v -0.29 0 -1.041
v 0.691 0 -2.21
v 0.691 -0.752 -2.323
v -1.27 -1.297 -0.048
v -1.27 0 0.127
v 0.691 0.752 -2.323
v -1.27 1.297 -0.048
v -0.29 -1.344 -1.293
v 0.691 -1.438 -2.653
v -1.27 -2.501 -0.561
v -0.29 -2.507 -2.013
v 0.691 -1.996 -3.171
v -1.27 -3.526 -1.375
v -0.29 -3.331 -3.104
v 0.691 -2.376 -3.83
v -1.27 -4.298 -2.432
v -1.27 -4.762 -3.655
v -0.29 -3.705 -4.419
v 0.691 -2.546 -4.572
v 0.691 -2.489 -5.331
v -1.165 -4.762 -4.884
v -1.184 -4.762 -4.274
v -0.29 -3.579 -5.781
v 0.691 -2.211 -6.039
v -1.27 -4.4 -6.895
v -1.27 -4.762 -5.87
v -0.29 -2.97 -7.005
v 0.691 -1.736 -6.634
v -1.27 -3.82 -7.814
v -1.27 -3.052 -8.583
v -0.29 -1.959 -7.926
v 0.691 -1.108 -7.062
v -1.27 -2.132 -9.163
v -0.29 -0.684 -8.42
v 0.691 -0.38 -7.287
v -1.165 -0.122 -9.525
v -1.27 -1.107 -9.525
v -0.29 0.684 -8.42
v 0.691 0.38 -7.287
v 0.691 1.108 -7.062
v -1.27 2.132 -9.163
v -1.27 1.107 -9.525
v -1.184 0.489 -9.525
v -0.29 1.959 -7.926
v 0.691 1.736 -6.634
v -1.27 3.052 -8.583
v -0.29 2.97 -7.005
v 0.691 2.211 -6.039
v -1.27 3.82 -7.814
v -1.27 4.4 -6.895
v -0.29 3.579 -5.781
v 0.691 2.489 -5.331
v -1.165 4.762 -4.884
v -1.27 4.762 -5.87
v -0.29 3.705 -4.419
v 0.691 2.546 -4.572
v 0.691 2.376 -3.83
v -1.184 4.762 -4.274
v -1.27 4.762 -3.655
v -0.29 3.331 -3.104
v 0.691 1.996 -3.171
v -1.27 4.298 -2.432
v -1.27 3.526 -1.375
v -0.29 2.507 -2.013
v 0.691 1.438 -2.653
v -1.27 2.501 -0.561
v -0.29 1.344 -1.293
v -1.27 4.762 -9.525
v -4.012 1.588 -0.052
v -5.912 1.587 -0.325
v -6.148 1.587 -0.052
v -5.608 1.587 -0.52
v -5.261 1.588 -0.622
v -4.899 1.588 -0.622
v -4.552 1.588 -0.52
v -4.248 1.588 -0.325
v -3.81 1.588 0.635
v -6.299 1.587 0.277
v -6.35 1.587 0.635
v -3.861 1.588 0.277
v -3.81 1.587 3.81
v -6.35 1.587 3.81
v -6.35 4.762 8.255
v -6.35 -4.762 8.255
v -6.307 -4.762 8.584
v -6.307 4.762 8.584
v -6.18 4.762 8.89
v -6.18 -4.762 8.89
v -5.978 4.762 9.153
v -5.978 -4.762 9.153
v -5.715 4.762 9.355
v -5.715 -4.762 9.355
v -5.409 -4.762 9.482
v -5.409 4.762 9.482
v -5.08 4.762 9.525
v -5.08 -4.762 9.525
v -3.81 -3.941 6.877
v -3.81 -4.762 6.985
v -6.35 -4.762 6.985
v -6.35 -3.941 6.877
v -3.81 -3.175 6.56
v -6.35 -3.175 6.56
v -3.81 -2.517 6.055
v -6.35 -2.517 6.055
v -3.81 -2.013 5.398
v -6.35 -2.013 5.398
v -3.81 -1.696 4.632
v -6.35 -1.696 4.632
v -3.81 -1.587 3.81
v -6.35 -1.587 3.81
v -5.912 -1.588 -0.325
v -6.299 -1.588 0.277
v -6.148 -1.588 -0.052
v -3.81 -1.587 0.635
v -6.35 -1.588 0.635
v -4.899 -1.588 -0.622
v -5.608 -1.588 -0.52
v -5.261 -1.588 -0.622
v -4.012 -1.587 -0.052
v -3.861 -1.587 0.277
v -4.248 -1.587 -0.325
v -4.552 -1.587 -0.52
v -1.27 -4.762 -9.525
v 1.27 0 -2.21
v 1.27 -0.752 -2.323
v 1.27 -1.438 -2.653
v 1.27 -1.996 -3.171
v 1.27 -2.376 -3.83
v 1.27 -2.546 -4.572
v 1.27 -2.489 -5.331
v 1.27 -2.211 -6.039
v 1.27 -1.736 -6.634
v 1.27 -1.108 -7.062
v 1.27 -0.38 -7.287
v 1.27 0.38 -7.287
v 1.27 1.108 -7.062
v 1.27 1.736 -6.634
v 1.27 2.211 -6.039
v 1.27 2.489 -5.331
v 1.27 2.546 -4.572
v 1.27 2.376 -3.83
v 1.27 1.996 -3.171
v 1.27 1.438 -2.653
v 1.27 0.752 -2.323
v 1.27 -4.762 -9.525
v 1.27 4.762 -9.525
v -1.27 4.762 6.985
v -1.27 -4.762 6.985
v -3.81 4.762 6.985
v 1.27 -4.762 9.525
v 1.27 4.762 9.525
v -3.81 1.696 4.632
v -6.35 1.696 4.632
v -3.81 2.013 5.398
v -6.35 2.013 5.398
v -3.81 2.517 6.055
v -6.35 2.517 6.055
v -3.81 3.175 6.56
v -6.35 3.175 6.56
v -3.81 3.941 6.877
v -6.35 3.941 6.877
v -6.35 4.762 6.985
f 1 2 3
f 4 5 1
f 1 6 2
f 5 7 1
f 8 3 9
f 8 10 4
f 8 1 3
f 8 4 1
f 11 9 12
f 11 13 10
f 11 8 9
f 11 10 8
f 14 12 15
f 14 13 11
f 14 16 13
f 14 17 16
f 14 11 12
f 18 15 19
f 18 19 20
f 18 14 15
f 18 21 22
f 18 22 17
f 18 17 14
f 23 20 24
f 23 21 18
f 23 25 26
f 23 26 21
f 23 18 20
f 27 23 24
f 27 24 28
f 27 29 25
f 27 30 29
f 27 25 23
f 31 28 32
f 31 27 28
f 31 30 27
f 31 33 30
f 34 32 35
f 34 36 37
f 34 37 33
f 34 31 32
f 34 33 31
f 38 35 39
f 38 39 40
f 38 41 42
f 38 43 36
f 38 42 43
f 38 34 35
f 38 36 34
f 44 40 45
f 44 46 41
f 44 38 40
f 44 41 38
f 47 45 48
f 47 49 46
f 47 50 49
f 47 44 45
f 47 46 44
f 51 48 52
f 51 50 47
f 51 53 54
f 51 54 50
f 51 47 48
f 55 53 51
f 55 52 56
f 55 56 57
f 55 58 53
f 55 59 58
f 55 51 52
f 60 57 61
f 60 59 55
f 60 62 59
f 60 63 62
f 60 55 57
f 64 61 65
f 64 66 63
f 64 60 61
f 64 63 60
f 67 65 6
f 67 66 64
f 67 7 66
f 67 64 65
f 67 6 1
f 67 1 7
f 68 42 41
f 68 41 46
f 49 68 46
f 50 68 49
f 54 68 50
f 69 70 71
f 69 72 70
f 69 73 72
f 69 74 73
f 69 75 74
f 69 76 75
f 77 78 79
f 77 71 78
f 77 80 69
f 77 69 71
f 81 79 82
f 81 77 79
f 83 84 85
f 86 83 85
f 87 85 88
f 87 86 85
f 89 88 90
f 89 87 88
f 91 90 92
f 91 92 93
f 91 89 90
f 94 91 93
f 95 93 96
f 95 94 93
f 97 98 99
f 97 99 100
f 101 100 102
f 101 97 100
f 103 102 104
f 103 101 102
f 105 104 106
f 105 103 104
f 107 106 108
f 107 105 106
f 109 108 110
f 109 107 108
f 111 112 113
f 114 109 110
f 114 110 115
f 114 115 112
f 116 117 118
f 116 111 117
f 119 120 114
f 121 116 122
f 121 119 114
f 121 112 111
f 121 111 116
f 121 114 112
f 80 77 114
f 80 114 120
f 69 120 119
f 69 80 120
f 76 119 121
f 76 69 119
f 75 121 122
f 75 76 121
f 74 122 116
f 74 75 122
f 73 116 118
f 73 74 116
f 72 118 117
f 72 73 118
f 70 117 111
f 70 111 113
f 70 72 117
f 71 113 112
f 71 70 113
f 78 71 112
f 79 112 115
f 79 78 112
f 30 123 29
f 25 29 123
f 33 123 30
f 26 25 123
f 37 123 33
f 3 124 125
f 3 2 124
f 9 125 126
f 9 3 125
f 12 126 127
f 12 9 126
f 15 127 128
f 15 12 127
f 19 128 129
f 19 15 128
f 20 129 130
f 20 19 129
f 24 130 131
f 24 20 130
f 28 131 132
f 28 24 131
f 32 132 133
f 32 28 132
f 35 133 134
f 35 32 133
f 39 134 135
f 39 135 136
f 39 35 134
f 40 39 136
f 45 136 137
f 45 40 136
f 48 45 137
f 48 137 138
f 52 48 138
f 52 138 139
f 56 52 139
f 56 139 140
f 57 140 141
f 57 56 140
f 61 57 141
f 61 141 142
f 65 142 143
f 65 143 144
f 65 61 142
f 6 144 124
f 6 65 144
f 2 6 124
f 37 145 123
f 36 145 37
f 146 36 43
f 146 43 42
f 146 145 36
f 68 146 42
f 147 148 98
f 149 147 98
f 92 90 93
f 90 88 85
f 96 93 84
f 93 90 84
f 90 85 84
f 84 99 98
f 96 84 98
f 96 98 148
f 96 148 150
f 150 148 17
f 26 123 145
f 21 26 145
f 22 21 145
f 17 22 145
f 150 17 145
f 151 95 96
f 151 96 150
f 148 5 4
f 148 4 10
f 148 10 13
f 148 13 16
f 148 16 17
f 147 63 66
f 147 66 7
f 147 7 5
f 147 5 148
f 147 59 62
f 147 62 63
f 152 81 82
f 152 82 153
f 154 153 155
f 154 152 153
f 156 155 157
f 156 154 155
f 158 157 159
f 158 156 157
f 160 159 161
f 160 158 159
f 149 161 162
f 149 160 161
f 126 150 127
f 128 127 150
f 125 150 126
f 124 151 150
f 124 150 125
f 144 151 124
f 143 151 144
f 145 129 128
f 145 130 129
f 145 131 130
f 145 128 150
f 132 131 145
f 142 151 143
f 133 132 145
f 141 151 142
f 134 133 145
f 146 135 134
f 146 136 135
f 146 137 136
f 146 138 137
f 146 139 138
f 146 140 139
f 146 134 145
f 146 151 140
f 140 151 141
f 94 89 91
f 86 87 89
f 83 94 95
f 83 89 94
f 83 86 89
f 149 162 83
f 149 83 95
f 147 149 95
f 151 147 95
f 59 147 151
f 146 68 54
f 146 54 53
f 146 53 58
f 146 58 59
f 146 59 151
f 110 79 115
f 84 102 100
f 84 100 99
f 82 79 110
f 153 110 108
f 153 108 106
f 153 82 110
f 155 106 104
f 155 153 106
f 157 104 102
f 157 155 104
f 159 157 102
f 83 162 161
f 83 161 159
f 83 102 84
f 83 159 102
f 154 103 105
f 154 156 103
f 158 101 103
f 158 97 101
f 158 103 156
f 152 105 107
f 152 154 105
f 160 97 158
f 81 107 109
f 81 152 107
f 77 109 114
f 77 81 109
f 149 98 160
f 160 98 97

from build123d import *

# Parameters (mm, degrees)
BOSS_EXTRUDE1_DEPTH = 4.7625
CUT_EXTRUDE1_START  = -1.27
CUT_EXTRUDE1_DEPTH  = 6.08


with BuildPart() as part:
    # Sketch1 → Boss-Extrude1 (new body, symmetric)
    with BuildSketch(Plane(origin=(0, 0, 0), x_dir=(1, 0, 0), z_dir=(0, 1, 0))):
        with BuildLine():
            Line((-5.08, -6.985), (-3.81, -6.985))
            Line((-3.81, -6.985), (-3.81, -0.635))
            ThreePointArc((-3.81, -0.635), (-5.08, 0.635), (-6.35, -0.635))
            Line((-6.35, -0.635), (-6.35, -8.255))
            ThreePointArc((-6.35, -8.255), (-5.978025612, -7.356974388), (-5.08, -6.985))
        make_face()
        with BuildLine():
            ThreePointArc((-6.35, -8.255), (-5.978025612, -9.153025612), (-5.08, -9.525))
            ThreePointArc((-5.08, -9.525), (-4.181974388, -9.153025612), (-3.81, -8.255))
            Line((-3.81, -8.255), (-3.81, -6.985))
            Line((-3.81, -6.985), (-5.08, -6.985))
            ThreePointArc((-5.08, -6.985), (-5.978025612, -7.356974388), (-6.35, -8.255))
        make_face()
        with BuildLine():
            Line((-5.08, -9.525), (-1.27, -9.525))
            Line((-1.27, -9.525), (-1.27, -6.985))
            Line((-1.27, -6.985), (-3.81, -6.985))
            Line((-3.81, -6.985), (-3.81, -8.255))
            ThreePointArc((-3.81, -8.255), (-4.181974388, -9.153025612), (-5.08, -9.525))
        make_face()
        with BuildLine():
            Line((-1.27, -6.985), (-1.27, -9.525))
            ThreePointArc((-1.27, -9.525), (0, -8.255), (-1.27, -6.985))
        make_face()
        with BuildLine():
            ThreePointArc((-1.27, -6.985), (0, -8.255), (-1.27, -9.525))
            Line((-1.27, -9.525), (1.27, -9.525))
            Line((1.27, -9.525), (1.27, 9.525))
            Line((1.27, 9.525), (-1.27, 9.525))
            Line((-1.27, 9.525), (-1.27, -6.985))
        make_face()
    extrude(amount=BOSS_EXTRUDE1_DEPTH, both=True)

    # Sketch3 → CSK for #10 Flat Head Machine Screw (100)1 (revolve, cut)
    with BuildSketch(Plane(origin=(-1.27, 0, -4.7625), x_dir=(0, 0, 1), z_dir=(0, 1, 0))):
        Polygon((0, 0), (0, 2.54), (2.5527, 2.54), (2.5527, 1.960808018), (4.8895, 0), align=None)
    revolve(axis=Axis((-7.62, 0, -4.7625), (1, 0, 0)), mode=Mode.SUBTRACT)

    # Sketch4 → Cut-Extrude1 (cut, through all)
    with BuildSketch(Plane(origin=(0, 0, 0), x_dir=(0, 0, -1), z_dir=(1, 0, 0)).offset(CUT_EXTRUDE1_START)):
        with BuildLine():
            Line((0.635, -7.9375), (-3.81, -7.9375))
            ThreePointArc((-3.81, -7.9375), (-6.985, -4.7625), (-3.81, -1.5875))
            Line((-3.81, -1.5875), (0.635, -1.5875))
            ThreePointArc((0.635, -1.5875), (3.81, -4.7625), (0.635, -7.9375))
        make_face()
        with BuildLine():
            Line((0.635, 1.5875), (-3.81, 1.5875))
            ThreePointArc((-3.81, 1.5875), (-6.985, 4.7625), (-3.81, 7.9375))
            Line((-3.81, 7.9375), (0.635, 7.9375))
            ThreePointArc((0.635, 7.9375), (3.81, 4.7625), (0.635, 1.5875))
        make_face()
    extrude(amount=-CUT_EXTRUDE1_DEPTH, mode=Mode.SUBTRACT)


solid = part.part
